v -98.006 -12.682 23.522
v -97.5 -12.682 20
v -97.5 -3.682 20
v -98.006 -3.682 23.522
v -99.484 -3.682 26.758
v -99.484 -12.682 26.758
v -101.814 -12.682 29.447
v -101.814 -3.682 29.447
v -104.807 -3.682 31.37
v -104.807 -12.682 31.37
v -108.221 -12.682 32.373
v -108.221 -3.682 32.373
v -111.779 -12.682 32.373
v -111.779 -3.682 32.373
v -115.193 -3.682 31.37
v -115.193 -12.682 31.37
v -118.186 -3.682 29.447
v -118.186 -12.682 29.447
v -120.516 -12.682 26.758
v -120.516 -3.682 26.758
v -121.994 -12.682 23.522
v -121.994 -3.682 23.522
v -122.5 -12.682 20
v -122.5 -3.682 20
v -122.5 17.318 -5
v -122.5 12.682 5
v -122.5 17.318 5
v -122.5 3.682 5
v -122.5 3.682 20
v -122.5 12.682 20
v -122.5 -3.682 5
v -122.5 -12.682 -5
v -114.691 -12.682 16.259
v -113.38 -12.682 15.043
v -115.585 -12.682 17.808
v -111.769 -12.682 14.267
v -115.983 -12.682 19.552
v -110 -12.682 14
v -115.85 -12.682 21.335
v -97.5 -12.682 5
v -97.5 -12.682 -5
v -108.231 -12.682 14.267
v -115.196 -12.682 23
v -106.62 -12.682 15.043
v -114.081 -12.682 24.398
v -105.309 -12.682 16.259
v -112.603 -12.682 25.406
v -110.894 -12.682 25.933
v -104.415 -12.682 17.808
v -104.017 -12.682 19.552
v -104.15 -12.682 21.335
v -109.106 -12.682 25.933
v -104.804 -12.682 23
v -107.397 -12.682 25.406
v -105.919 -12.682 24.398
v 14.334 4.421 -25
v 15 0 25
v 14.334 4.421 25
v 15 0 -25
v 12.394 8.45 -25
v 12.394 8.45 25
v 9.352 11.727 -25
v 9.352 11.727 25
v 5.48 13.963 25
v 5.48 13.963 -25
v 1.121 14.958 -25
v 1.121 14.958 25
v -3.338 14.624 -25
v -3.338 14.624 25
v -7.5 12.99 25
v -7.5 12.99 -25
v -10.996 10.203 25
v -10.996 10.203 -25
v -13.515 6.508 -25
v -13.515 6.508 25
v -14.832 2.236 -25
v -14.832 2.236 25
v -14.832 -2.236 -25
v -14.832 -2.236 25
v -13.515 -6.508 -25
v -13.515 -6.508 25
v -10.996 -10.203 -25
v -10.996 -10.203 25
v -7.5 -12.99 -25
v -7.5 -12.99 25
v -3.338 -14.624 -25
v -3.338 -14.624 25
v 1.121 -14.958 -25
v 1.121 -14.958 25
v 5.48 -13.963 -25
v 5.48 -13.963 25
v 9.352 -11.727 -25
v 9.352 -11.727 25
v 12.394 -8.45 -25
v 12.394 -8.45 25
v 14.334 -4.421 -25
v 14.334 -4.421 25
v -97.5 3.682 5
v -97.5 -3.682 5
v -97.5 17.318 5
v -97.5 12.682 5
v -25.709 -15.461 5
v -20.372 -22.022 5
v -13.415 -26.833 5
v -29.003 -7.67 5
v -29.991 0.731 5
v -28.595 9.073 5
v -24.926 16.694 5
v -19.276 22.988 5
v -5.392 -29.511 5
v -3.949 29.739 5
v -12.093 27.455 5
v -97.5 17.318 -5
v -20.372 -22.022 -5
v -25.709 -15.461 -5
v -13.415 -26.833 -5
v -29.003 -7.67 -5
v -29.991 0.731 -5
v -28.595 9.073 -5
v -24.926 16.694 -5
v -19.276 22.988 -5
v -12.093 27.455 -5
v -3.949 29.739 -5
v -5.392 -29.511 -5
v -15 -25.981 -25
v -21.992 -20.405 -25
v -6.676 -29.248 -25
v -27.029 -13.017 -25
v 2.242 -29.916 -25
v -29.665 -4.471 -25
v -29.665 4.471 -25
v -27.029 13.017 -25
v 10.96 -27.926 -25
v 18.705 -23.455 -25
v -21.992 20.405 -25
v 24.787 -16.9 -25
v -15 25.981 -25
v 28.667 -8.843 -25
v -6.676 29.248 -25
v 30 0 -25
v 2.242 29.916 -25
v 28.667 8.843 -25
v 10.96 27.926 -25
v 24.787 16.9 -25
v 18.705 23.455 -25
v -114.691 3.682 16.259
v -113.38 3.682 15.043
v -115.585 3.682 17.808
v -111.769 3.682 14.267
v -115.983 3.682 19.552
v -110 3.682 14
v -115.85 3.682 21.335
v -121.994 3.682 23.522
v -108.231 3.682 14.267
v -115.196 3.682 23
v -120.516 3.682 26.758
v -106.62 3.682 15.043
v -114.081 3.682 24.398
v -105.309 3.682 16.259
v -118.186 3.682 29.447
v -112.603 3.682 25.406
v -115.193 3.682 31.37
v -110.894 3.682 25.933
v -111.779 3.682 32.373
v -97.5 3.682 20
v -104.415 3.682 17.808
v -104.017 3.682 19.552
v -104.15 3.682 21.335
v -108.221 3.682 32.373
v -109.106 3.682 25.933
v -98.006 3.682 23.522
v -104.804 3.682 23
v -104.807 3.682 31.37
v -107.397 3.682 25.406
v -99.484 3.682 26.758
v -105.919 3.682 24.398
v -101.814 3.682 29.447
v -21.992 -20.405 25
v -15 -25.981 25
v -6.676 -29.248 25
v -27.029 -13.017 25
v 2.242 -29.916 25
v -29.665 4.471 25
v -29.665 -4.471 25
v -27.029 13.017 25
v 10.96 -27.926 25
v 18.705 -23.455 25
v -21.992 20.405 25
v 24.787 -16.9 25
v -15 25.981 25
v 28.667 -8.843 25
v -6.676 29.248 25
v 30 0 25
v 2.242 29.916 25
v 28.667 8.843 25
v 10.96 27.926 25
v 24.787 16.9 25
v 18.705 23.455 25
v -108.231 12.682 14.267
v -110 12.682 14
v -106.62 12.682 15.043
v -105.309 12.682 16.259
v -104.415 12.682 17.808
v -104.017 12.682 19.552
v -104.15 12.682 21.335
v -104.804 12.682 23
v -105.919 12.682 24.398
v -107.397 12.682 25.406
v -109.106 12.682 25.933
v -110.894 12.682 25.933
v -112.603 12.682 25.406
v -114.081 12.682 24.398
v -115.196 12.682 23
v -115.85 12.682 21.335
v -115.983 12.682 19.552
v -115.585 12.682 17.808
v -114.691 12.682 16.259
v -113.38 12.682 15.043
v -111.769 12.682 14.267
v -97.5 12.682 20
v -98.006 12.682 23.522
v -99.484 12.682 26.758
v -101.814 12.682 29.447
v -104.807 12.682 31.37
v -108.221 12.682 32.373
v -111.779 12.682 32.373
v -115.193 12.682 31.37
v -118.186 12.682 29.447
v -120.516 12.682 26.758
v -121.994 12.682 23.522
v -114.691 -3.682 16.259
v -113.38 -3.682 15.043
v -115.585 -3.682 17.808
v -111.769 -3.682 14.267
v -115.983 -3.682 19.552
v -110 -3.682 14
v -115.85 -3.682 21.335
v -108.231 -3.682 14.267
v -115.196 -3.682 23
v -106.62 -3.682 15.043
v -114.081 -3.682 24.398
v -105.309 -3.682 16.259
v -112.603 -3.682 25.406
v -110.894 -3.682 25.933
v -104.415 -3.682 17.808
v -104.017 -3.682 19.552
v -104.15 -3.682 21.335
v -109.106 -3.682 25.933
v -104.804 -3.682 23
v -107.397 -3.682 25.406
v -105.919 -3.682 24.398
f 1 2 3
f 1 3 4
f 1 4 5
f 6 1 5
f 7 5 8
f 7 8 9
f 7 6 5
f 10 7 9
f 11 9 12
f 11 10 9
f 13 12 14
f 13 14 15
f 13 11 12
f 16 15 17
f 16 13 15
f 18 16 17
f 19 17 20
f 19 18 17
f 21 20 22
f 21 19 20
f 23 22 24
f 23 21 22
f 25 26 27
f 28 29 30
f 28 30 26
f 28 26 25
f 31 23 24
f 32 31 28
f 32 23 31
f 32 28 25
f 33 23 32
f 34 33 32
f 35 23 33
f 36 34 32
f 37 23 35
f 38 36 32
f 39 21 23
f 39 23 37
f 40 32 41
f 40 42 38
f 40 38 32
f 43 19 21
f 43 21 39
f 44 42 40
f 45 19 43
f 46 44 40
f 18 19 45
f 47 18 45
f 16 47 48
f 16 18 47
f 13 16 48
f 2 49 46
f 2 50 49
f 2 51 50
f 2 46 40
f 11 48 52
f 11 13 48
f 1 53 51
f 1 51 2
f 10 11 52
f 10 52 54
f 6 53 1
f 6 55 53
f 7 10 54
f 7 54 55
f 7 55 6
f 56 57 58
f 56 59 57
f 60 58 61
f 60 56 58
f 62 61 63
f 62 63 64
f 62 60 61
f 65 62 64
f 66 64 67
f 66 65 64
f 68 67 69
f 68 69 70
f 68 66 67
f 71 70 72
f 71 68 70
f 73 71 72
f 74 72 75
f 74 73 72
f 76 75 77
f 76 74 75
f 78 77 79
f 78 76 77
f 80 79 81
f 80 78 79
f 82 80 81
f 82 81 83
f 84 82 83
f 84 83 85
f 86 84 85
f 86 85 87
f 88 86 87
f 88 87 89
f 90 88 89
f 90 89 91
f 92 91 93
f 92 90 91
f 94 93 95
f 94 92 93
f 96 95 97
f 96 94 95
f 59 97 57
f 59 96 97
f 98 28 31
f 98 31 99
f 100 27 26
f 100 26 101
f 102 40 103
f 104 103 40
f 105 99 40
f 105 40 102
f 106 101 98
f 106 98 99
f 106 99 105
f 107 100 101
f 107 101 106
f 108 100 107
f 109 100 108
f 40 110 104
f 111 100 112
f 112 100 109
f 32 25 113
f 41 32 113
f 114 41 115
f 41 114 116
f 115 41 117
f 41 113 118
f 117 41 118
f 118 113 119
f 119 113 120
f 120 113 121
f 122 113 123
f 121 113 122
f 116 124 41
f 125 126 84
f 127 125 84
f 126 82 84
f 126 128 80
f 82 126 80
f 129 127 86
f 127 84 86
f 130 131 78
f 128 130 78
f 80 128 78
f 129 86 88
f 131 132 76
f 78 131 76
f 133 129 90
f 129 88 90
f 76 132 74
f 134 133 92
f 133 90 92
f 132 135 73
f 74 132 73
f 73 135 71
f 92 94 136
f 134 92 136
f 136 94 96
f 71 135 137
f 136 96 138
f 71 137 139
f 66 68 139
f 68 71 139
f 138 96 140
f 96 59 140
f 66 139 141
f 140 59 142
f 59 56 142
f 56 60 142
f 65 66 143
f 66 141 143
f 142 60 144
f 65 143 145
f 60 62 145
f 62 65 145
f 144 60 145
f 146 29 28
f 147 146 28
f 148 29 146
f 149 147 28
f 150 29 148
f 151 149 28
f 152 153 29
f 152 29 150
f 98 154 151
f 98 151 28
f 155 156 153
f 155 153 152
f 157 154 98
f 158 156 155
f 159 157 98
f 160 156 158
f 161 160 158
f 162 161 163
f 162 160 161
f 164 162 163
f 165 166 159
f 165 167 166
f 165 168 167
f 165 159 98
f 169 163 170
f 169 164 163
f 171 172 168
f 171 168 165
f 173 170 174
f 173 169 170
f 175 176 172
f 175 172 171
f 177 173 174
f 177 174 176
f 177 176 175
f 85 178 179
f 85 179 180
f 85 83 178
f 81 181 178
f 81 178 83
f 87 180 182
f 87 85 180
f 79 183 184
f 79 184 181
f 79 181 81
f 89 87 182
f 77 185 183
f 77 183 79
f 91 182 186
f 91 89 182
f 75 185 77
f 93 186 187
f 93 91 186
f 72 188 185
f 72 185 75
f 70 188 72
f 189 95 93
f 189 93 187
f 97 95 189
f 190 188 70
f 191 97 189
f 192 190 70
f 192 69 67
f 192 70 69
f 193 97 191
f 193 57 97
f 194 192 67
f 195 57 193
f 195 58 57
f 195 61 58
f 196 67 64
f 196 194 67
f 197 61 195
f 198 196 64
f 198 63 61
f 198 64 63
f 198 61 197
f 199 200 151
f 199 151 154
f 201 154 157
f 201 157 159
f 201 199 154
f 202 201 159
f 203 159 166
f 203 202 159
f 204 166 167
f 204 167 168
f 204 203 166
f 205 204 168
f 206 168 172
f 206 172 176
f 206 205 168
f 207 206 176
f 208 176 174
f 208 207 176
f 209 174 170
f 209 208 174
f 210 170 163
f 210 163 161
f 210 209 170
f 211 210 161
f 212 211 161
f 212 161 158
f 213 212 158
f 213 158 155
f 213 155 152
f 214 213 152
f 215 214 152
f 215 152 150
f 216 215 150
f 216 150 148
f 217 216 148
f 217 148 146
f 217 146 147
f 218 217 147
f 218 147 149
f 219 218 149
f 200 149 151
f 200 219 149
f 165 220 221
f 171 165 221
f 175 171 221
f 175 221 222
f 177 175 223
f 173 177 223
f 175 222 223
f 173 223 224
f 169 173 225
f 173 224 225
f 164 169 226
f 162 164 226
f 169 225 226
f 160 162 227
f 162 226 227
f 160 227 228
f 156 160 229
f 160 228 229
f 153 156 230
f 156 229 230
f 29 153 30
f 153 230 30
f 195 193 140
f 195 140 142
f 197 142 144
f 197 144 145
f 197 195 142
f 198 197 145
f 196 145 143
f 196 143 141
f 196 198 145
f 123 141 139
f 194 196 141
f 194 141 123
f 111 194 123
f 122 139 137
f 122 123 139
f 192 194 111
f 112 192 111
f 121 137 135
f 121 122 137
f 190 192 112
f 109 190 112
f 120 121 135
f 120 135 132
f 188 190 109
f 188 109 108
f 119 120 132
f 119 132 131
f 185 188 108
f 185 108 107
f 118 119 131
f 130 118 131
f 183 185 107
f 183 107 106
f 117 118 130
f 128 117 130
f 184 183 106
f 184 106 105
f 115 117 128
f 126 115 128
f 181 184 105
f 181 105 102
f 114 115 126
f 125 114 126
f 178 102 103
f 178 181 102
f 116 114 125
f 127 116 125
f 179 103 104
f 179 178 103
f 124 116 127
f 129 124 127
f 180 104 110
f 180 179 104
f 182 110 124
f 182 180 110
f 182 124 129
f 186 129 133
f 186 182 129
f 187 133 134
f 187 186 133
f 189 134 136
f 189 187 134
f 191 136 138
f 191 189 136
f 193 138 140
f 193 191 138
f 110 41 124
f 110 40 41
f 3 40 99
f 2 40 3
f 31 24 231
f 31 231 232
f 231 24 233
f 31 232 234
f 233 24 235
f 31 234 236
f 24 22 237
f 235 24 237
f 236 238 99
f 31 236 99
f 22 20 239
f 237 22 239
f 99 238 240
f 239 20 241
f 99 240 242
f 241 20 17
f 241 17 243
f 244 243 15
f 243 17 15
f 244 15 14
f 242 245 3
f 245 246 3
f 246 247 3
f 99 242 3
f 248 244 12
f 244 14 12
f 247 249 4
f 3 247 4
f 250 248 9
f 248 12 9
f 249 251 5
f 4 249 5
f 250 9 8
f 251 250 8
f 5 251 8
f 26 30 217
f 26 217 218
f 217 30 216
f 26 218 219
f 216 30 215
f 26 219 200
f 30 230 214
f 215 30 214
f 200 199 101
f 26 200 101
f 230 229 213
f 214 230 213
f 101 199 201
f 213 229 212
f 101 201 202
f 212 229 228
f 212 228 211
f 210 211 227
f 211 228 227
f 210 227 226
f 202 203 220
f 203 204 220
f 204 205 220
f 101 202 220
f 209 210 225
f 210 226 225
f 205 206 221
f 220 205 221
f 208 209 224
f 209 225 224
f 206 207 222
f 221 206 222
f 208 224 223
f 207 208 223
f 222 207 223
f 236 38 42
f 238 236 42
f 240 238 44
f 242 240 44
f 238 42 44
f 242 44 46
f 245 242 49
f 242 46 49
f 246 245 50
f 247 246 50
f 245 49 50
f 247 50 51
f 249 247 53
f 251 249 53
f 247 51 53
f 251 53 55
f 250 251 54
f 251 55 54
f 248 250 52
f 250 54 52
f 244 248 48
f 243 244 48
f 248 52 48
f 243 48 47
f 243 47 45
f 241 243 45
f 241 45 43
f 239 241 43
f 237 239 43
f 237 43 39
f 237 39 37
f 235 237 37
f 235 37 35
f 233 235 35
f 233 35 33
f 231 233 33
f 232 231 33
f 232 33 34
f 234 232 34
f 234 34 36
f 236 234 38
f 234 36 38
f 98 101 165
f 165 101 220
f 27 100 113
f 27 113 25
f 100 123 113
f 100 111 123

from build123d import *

# Parameters (mm, degrees)
SKETCH1_R           = 30
SKETCH1_R_2         = 15
BOSS_EXTRUDE1_DEPTH = 25
BOSS_EXTRUDE2_DEPTH = 5
SKETCH3_R           = 6
BOSS_EXTRUDE4_DEPTH = 9


with BuildPart() as part:
    # Sketch1 → Boss-Extrude1 (new body, symmetric)
    with BuildSketch(Plane.XY):
        Circle(SKETCH1_R)
        Circle(SKETCH1_R_2, mode=Mode.SUBTRACT)
    extrude(amount=BOSS_EXTRUDE1_DEPTH, both=True)

    # Sketch2 → Boss-Extrude2 (add, symmetric)
    with BuildSketch(Plane.XY):
        with BuildLine():
            Line((-3.948644693, 29.739001414), (-97.5, 17.317566762))
            Line((-97.5, 17.317566762), (-122.5, 17.317566762))
            Line((-122.5, 17.317566762), (-122.5, -12.682433238))
            Line((-122.5, -12.682433238), (-97.5, -12.682433238))
            Line((-97.5, -12.682433238), (-5.392030099, -29.511455596))
            ThreePointArc((-5.392030099, -29.511455596), (-29.99110227, 0.730605661), (-3.948644693, 29.739001414))
        make_face()
    extrude(amount=BOSS_EXTRUDE2_DEPTH, both=True)

    # Sketch3 → Boss-Extrude4 (add)
    with BuildSketch(Plane.XZ.offset(12.682433238)):
        with BuildLine():
            Line((-122.5, 5), (-97.5, 5))
            Line((-97.5, 5), (-97.5, 20))
            ThreePointArc((-97.5, 20), (-110, 32.5), (-122.5, 20))
            Line((-122.5, 20), (-122.5, 5))
        make_face()
        with Locations(Location((-110, 20, 0), (0, 0, 270))):  # turned: the seam where the file's is
            Circle(SKETCH3_R, mode=Mode.SUBTRACT)
    boss_extrude4 = extrude(amount=-BOSS_EXTRUDE4_DEPTH)

    # Mirror1: Boss-Extrude4 across plane
    add(boss_extrude4.mirror(Plane.ZX))


solid = part.part
